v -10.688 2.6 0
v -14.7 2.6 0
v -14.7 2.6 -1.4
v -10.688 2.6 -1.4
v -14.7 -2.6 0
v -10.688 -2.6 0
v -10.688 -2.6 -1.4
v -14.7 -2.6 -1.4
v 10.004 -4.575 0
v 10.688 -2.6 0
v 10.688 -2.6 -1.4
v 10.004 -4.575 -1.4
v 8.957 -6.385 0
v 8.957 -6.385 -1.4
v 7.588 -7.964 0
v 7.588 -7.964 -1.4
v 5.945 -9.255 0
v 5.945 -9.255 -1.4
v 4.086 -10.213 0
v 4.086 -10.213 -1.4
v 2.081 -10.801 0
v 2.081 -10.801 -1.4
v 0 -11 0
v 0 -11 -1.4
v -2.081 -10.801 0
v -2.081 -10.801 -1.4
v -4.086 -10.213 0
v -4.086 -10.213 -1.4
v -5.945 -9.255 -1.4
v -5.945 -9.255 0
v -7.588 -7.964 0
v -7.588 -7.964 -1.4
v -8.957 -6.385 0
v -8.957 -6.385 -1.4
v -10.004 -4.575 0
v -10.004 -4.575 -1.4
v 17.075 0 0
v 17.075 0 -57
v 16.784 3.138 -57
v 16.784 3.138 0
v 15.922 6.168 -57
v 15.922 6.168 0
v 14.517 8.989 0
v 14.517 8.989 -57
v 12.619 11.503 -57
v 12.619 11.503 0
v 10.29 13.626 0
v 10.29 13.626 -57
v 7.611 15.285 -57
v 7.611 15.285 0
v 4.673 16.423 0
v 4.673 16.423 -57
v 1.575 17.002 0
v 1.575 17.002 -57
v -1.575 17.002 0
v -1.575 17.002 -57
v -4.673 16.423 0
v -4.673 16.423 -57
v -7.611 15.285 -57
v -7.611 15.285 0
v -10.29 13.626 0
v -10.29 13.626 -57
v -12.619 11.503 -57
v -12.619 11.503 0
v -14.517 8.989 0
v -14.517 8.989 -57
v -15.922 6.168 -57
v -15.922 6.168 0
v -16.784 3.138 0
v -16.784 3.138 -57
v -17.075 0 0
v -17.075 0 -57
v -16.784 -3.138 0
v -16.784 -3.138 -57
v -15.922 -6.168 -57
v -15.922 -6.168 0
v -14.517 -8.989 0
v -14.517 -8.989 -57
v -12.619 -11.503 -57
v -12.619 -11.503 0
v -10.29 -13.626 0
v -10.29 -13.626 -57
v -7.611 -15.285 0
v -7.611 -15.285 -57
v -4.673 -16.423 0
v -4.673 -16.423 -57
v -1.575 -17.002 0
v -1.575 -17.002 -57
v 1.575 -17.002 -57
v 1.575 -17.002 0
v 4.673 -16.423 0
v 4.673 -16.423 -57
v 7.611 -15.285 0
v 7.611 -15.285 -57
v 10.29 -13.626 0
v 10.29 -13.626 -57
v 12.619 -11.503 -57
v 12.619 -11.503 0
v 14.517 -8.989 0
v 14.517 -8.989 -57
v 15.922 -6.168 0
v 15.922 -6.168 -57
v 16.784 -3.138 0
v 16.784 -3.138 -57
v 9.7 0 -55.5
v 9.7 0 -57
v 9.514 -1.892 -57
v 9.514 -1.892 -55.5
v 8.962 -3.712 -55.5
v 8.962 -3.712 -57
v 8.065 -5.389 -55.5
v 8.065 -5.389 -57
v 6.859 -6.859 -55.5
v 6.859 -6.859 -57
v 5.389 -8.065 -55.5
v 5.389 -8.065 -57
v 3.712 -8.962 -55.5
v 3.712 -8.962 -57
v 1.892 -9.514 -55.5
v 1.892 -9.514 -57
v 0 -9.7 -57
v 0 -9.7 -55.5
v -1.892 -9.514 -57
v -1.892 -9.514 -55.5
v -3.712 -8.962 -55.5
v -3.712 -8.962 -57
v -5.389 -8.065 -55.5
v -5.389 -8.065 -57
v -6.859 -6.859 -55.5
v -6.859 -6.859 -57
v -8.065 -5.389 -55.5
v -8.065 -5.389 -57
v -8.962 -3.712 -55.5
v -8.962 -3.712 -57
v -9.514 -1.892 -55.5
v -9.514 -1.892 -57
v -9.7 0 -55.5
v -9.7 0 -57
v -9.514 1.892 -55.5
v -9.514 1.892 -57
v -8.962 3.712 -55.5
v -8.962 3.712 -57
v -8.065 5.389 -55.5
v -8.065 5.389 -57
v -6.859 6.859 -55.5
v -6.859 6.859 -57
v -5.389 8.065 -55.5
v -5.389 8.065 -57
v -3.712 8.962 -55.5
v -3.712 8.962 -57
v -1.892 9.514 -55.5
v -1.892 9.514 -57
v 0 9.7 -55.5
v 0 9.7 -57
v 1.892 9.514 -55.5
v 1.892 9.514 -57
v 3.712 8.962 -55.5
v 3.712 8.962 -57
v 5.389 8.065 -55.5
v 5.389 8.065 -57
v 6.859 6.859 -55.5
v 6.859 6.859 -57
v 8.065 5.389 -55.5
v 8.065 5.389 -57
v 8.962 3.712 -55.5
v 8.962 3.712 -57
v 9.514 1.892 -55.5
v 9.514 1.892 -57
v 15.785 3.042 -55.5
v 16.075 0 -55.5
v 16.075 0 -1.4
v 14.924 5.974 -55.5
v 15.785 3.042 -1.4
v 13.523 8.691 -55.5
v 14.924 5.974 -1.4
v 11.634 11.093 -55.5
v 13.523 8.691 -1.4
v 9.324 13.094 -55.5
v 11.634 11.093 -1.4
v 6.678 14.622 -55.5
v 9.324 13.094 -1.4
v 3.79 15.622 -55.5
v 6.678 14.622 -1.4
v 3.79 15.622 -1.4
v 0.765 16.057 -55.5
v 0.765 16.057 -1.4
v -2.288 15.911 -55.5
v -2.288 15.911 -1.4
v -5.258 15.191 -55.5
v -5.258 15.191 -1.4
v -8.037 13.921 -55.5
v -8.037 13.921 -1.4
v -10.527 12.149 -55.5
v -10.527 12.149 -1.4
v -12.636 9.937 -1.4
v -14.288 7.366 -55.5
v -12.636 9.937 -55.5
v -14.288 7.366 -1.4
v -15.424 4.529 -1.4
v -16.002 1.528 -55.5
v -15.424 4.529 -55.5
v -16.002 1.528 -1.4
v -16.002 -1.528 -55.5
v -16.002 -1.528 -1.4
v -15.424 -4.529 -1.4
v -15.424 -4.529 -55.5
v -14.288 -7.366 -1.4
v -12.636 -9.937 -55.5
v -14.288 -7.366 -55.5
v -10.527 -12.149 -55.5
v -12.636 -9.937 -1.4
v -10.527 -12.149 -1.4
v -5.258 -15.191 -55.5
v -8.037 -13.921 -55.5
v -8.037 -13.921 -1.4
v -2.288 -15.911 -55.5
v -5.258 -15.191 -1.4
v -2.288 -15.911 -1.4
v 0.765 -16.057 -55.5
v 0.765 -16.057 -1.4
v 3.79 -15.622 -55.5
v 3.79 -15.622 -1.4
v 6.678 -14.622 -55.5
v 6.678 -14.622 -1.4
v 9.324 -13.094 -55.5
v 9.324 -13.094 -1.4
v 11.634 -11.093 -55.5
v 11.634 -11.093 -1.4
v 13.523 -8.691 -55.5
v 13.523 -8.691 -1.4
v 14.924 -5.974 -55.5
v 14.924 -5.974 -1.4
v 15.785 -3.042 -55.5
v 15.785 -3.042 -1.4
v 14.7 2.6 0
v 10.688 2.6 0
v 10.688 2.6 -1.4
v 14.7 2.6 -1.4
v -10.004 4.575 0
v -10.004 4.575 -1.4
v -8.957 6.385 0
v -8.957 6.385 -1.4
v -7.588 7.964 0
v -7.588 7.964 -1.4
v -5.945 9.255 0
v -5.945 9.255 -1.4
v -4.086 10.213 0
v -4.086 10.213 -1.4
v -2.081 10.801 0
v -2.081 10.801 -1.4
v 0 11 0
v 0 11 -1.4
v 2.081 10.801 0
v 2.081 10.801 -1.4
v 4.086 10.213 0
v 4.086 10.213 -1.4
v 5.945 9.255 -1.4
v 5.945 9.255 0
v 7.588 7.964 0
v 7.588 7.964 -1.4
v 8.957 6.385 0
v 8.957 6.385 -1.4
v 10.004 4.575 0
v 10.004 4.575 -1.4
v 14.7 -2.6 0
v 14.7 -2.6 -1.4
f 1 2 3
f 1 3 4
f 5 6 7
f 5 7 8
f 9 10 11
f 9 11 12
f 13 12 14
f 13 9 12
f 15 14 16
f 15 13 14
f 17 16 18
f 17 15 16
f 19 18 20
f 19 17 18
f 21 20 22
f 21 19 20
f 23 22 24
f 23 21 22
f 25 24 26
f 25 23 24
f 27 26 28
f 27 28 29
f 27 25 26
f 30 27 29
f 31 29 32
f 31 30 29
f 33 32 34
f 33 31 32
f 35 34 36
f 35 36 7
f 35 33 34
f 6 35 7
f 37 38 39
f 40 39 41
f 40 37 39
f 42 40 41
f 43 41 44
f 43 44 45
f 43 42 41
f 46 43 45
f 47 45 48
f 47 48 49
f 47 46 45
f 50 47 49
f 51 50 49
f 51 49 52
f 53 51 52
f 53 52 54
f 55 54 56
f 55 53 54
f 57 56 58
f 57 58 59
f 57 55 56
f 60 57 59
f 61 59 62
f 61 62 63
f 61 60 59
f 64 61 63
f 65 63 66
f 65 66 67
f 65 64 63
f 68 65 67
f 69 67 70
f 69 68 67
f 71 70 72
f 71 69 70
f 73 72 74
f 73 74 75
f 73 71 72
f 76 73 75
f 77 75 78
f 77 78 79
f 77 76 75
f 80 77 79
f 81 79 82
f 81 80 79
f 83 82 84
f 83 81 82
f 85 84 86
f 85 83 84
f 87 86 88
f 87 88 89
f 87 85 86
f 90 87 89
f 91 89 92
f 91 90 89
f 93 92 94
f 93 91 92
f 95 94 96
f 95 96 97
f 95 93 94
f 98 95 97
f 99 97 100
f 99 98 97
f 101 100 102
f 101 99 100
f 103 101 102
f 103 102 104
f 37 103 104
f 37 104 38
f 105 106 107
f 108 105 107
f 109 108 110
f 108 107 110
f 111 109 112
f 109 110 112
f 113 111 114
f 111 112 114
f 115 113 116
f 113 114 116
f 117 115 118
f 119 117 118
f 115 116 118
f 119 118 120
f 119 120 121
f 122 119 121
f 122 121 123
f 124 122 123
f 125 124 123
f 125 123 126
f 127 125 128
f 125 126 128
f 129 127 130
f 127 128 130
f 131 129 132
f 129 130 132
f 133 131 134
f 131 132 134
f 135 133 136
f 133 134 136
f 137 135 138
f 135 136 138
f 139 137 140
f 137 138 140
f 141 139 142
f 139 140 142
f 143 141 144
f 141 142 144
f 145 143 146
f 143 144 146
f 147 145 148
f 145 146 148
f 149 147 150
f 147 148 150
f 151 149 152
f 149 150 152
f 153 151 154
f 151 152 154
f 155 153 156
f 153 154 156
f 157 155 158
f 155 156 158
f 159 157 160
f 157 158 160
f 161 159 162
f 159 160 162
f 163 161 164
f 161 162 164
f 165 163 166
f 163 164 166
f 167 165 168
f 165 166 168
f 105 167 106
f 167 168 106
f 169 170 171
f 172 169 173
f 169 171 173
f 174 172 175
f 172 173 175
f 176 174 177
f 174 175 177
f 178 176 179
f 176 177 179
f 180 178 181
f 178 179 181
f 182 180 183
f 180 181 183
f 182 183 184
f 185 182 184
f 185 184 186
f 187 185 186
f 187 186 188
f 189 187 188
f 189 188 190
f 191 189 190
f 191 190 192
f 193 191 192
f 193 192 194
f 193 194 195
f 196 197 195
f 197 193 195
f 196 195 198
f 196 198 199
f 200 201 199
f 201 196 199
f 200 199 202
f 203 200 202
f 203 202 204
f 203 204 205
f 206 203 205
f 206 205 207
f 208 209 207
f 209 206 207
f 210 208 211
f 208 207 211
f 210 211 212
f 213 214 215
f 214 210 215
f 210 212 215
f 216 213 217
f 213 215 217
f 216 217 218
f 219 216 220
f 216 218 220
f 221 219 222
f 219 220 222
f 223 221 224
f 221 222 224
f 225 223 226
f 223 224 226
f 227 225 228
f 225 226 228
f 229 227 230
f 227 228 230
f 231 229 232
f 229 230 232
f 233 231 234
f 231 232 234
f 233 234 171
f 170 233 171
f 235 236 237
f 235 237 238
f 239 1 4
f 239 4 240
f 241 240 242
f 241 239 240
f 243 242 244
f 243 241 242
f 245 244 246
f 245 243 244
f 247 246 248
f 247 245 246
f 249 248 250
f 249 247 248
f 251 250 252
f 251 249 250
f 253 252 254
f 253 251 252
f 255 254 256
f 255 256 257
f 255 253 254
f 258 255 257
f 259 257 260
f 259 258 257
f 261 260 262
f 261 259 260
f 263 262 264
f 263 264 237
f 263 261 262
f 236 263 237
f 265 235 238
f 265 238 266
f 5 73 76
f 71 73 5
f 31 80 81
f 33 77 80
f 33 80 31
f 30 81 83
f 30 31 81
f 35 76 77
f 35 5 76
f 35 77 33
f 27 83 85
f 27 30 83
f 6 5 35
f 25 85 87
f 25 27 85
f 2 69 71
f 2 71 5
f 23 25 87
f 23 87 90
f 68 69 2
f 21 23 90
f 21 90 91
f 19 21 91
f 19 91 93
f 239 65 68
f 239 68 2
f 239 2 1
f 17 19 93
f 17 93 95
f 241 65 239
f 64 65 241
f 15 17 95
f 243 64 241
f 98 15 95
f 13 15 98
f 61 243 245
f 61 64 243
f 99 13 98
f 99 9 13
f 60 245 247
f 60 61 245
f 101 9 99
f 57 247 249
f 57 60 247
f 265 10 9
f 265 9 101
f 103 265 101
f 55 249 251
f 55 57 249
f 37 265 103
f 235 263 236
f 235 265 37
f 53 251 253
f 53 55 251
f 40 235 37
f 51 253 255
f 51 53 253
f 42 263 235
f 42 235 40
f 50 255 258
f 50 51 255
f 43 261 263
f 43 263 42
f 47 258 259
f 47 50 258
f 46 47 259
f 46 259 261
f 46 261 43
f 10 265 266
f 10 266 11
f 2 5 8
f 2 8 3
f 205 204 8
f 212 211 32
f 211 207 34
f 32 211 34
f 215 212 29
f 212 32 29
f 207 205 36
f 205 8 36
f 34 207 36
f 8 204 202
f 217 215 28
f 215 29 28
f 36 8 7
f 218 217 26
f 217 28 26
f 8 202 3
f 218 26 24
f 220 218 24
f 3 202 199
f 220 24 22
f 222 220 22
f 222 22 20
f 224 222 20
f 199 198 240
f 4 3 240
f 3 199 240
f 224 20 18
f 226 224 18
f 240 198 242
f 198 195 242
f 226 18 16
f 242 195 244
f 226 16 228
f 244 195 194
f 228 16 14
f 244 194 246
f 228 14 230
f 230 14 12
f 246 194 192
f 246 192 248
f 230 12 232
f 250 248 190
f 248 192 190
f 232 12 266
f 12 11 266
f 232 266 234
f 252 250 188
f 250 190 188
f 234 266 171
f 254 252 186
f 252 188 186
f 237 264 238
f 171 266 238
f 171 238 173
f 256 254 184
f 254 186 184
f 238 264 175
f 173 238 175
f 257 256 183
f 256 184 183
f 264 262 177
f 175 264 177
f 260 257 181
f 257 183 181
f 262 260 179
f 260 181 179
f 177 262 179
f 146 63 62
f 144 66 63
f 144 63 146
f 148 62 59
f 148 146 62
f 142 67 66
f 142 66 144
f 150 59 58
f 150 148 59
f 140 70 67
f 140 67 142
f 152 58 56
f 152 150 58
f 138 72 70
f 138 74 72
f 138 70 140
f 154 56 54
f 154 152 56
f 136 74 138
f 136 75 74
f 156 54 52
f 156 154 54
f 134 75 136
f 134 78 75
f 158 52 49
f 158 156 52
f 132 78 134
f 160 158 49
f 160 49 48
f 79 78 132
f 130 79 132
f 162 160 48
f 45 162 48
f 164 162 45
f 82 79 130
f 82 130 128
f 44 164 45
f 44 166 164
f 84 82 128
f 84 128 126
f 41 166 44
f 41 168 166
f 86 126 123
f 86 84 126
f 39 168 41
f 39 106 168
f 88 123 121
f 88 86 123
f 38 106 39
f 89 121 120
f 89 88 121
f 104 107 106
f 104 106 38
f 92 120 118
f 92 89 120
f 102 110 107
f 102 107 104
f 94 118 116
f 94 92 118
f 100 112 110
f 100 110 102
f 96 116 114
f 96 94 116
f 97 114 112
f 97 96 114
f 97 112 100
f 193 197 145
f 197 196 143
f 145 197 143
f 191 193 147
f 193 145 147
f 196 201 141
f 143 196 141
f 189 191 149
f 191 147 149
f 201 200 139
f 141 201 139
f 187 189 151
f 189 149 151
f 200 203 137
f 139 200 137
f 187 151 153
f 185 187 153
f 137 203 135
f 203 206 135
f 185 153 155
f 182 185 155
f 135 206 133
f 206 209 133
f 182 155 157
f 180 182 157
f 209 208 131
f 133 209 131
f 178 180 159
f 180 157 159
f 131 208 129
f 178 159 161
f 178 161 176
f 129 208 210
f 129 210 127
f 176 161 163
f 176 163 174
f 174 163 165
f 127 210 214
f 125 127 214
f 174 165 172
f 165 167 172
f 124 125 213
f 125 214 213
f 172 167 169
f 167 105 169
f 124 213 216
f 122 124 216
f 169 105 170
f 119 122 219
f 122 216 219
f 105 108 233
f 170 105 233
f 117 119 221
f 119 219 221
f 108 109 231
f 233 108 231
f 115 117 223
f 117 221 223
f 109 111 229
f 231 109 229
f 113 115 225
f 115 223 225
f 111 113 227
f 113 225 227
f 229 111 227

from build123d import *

# Parameters (mm, degrees)
F0_R     = 17.075
F0_R_2   = 16.075
F1_DEPTH = 57
F2_R     = 16.075
F3_DEPTH = 1.4
F4_R     = 16.075
F4_R_2   = 9.7
F5_DEPTH = 1.5


with BuildPart() as f1:
    # F0 (on Top) → F1 (new body)
    with BuildSketch(Plane.XY):
        Circle(F0_R)
        Circle(F0_R_2, mode=Mode.SUBTRACT)
    extrude(amount=-F1_DEPTH)

    # F2 (on face) → F3 (join)
    with BuildSketch(Plane.XY):
        Circle(F2_R)
        with BuildLine():
            ThreePointArc((-10.6883113727, 2.6), (0, 11), (10.6883113727, 2.6))
            Line((10.6883113727, 2.6), (14.7, 2.6))
            Line((14.7, 2.6), (14.7, 0))
            Line((14.7, 0), (14.7, -2.6))
            Line((14.7, -2.6), (10.6883113727, -2.6))
            ThreePointArc((10.6883113727, -2.6), (0, -11), (-10.6883113727, -2.6))
            Line((-10.6883113727, -2.6), (-14.7, -2.6))
            Line((-14.7, -2.6), (-14.7, 0))
            Line((-14.7, 0), (-14.7, 2.6))
            Line((-14.7, 2.6), (-10.6883113727, 2.6))
        make_face(mode=Mode.SUBTRACT)
    extrude(amount=-F3_DEPTH)

    # F4 (on face) → F5 (join)
    with BuildSketch(Plane(origin=(0, 0, -57), x_dir=(1, 0, 0), z_dir=(0, 0, -1))):
        Circle(F4_R)
        Circle(F4_R_2, mode=Mode.SUBTRACT)
    extrude(amount=-F5_DEPTH)


solid = f1.part
